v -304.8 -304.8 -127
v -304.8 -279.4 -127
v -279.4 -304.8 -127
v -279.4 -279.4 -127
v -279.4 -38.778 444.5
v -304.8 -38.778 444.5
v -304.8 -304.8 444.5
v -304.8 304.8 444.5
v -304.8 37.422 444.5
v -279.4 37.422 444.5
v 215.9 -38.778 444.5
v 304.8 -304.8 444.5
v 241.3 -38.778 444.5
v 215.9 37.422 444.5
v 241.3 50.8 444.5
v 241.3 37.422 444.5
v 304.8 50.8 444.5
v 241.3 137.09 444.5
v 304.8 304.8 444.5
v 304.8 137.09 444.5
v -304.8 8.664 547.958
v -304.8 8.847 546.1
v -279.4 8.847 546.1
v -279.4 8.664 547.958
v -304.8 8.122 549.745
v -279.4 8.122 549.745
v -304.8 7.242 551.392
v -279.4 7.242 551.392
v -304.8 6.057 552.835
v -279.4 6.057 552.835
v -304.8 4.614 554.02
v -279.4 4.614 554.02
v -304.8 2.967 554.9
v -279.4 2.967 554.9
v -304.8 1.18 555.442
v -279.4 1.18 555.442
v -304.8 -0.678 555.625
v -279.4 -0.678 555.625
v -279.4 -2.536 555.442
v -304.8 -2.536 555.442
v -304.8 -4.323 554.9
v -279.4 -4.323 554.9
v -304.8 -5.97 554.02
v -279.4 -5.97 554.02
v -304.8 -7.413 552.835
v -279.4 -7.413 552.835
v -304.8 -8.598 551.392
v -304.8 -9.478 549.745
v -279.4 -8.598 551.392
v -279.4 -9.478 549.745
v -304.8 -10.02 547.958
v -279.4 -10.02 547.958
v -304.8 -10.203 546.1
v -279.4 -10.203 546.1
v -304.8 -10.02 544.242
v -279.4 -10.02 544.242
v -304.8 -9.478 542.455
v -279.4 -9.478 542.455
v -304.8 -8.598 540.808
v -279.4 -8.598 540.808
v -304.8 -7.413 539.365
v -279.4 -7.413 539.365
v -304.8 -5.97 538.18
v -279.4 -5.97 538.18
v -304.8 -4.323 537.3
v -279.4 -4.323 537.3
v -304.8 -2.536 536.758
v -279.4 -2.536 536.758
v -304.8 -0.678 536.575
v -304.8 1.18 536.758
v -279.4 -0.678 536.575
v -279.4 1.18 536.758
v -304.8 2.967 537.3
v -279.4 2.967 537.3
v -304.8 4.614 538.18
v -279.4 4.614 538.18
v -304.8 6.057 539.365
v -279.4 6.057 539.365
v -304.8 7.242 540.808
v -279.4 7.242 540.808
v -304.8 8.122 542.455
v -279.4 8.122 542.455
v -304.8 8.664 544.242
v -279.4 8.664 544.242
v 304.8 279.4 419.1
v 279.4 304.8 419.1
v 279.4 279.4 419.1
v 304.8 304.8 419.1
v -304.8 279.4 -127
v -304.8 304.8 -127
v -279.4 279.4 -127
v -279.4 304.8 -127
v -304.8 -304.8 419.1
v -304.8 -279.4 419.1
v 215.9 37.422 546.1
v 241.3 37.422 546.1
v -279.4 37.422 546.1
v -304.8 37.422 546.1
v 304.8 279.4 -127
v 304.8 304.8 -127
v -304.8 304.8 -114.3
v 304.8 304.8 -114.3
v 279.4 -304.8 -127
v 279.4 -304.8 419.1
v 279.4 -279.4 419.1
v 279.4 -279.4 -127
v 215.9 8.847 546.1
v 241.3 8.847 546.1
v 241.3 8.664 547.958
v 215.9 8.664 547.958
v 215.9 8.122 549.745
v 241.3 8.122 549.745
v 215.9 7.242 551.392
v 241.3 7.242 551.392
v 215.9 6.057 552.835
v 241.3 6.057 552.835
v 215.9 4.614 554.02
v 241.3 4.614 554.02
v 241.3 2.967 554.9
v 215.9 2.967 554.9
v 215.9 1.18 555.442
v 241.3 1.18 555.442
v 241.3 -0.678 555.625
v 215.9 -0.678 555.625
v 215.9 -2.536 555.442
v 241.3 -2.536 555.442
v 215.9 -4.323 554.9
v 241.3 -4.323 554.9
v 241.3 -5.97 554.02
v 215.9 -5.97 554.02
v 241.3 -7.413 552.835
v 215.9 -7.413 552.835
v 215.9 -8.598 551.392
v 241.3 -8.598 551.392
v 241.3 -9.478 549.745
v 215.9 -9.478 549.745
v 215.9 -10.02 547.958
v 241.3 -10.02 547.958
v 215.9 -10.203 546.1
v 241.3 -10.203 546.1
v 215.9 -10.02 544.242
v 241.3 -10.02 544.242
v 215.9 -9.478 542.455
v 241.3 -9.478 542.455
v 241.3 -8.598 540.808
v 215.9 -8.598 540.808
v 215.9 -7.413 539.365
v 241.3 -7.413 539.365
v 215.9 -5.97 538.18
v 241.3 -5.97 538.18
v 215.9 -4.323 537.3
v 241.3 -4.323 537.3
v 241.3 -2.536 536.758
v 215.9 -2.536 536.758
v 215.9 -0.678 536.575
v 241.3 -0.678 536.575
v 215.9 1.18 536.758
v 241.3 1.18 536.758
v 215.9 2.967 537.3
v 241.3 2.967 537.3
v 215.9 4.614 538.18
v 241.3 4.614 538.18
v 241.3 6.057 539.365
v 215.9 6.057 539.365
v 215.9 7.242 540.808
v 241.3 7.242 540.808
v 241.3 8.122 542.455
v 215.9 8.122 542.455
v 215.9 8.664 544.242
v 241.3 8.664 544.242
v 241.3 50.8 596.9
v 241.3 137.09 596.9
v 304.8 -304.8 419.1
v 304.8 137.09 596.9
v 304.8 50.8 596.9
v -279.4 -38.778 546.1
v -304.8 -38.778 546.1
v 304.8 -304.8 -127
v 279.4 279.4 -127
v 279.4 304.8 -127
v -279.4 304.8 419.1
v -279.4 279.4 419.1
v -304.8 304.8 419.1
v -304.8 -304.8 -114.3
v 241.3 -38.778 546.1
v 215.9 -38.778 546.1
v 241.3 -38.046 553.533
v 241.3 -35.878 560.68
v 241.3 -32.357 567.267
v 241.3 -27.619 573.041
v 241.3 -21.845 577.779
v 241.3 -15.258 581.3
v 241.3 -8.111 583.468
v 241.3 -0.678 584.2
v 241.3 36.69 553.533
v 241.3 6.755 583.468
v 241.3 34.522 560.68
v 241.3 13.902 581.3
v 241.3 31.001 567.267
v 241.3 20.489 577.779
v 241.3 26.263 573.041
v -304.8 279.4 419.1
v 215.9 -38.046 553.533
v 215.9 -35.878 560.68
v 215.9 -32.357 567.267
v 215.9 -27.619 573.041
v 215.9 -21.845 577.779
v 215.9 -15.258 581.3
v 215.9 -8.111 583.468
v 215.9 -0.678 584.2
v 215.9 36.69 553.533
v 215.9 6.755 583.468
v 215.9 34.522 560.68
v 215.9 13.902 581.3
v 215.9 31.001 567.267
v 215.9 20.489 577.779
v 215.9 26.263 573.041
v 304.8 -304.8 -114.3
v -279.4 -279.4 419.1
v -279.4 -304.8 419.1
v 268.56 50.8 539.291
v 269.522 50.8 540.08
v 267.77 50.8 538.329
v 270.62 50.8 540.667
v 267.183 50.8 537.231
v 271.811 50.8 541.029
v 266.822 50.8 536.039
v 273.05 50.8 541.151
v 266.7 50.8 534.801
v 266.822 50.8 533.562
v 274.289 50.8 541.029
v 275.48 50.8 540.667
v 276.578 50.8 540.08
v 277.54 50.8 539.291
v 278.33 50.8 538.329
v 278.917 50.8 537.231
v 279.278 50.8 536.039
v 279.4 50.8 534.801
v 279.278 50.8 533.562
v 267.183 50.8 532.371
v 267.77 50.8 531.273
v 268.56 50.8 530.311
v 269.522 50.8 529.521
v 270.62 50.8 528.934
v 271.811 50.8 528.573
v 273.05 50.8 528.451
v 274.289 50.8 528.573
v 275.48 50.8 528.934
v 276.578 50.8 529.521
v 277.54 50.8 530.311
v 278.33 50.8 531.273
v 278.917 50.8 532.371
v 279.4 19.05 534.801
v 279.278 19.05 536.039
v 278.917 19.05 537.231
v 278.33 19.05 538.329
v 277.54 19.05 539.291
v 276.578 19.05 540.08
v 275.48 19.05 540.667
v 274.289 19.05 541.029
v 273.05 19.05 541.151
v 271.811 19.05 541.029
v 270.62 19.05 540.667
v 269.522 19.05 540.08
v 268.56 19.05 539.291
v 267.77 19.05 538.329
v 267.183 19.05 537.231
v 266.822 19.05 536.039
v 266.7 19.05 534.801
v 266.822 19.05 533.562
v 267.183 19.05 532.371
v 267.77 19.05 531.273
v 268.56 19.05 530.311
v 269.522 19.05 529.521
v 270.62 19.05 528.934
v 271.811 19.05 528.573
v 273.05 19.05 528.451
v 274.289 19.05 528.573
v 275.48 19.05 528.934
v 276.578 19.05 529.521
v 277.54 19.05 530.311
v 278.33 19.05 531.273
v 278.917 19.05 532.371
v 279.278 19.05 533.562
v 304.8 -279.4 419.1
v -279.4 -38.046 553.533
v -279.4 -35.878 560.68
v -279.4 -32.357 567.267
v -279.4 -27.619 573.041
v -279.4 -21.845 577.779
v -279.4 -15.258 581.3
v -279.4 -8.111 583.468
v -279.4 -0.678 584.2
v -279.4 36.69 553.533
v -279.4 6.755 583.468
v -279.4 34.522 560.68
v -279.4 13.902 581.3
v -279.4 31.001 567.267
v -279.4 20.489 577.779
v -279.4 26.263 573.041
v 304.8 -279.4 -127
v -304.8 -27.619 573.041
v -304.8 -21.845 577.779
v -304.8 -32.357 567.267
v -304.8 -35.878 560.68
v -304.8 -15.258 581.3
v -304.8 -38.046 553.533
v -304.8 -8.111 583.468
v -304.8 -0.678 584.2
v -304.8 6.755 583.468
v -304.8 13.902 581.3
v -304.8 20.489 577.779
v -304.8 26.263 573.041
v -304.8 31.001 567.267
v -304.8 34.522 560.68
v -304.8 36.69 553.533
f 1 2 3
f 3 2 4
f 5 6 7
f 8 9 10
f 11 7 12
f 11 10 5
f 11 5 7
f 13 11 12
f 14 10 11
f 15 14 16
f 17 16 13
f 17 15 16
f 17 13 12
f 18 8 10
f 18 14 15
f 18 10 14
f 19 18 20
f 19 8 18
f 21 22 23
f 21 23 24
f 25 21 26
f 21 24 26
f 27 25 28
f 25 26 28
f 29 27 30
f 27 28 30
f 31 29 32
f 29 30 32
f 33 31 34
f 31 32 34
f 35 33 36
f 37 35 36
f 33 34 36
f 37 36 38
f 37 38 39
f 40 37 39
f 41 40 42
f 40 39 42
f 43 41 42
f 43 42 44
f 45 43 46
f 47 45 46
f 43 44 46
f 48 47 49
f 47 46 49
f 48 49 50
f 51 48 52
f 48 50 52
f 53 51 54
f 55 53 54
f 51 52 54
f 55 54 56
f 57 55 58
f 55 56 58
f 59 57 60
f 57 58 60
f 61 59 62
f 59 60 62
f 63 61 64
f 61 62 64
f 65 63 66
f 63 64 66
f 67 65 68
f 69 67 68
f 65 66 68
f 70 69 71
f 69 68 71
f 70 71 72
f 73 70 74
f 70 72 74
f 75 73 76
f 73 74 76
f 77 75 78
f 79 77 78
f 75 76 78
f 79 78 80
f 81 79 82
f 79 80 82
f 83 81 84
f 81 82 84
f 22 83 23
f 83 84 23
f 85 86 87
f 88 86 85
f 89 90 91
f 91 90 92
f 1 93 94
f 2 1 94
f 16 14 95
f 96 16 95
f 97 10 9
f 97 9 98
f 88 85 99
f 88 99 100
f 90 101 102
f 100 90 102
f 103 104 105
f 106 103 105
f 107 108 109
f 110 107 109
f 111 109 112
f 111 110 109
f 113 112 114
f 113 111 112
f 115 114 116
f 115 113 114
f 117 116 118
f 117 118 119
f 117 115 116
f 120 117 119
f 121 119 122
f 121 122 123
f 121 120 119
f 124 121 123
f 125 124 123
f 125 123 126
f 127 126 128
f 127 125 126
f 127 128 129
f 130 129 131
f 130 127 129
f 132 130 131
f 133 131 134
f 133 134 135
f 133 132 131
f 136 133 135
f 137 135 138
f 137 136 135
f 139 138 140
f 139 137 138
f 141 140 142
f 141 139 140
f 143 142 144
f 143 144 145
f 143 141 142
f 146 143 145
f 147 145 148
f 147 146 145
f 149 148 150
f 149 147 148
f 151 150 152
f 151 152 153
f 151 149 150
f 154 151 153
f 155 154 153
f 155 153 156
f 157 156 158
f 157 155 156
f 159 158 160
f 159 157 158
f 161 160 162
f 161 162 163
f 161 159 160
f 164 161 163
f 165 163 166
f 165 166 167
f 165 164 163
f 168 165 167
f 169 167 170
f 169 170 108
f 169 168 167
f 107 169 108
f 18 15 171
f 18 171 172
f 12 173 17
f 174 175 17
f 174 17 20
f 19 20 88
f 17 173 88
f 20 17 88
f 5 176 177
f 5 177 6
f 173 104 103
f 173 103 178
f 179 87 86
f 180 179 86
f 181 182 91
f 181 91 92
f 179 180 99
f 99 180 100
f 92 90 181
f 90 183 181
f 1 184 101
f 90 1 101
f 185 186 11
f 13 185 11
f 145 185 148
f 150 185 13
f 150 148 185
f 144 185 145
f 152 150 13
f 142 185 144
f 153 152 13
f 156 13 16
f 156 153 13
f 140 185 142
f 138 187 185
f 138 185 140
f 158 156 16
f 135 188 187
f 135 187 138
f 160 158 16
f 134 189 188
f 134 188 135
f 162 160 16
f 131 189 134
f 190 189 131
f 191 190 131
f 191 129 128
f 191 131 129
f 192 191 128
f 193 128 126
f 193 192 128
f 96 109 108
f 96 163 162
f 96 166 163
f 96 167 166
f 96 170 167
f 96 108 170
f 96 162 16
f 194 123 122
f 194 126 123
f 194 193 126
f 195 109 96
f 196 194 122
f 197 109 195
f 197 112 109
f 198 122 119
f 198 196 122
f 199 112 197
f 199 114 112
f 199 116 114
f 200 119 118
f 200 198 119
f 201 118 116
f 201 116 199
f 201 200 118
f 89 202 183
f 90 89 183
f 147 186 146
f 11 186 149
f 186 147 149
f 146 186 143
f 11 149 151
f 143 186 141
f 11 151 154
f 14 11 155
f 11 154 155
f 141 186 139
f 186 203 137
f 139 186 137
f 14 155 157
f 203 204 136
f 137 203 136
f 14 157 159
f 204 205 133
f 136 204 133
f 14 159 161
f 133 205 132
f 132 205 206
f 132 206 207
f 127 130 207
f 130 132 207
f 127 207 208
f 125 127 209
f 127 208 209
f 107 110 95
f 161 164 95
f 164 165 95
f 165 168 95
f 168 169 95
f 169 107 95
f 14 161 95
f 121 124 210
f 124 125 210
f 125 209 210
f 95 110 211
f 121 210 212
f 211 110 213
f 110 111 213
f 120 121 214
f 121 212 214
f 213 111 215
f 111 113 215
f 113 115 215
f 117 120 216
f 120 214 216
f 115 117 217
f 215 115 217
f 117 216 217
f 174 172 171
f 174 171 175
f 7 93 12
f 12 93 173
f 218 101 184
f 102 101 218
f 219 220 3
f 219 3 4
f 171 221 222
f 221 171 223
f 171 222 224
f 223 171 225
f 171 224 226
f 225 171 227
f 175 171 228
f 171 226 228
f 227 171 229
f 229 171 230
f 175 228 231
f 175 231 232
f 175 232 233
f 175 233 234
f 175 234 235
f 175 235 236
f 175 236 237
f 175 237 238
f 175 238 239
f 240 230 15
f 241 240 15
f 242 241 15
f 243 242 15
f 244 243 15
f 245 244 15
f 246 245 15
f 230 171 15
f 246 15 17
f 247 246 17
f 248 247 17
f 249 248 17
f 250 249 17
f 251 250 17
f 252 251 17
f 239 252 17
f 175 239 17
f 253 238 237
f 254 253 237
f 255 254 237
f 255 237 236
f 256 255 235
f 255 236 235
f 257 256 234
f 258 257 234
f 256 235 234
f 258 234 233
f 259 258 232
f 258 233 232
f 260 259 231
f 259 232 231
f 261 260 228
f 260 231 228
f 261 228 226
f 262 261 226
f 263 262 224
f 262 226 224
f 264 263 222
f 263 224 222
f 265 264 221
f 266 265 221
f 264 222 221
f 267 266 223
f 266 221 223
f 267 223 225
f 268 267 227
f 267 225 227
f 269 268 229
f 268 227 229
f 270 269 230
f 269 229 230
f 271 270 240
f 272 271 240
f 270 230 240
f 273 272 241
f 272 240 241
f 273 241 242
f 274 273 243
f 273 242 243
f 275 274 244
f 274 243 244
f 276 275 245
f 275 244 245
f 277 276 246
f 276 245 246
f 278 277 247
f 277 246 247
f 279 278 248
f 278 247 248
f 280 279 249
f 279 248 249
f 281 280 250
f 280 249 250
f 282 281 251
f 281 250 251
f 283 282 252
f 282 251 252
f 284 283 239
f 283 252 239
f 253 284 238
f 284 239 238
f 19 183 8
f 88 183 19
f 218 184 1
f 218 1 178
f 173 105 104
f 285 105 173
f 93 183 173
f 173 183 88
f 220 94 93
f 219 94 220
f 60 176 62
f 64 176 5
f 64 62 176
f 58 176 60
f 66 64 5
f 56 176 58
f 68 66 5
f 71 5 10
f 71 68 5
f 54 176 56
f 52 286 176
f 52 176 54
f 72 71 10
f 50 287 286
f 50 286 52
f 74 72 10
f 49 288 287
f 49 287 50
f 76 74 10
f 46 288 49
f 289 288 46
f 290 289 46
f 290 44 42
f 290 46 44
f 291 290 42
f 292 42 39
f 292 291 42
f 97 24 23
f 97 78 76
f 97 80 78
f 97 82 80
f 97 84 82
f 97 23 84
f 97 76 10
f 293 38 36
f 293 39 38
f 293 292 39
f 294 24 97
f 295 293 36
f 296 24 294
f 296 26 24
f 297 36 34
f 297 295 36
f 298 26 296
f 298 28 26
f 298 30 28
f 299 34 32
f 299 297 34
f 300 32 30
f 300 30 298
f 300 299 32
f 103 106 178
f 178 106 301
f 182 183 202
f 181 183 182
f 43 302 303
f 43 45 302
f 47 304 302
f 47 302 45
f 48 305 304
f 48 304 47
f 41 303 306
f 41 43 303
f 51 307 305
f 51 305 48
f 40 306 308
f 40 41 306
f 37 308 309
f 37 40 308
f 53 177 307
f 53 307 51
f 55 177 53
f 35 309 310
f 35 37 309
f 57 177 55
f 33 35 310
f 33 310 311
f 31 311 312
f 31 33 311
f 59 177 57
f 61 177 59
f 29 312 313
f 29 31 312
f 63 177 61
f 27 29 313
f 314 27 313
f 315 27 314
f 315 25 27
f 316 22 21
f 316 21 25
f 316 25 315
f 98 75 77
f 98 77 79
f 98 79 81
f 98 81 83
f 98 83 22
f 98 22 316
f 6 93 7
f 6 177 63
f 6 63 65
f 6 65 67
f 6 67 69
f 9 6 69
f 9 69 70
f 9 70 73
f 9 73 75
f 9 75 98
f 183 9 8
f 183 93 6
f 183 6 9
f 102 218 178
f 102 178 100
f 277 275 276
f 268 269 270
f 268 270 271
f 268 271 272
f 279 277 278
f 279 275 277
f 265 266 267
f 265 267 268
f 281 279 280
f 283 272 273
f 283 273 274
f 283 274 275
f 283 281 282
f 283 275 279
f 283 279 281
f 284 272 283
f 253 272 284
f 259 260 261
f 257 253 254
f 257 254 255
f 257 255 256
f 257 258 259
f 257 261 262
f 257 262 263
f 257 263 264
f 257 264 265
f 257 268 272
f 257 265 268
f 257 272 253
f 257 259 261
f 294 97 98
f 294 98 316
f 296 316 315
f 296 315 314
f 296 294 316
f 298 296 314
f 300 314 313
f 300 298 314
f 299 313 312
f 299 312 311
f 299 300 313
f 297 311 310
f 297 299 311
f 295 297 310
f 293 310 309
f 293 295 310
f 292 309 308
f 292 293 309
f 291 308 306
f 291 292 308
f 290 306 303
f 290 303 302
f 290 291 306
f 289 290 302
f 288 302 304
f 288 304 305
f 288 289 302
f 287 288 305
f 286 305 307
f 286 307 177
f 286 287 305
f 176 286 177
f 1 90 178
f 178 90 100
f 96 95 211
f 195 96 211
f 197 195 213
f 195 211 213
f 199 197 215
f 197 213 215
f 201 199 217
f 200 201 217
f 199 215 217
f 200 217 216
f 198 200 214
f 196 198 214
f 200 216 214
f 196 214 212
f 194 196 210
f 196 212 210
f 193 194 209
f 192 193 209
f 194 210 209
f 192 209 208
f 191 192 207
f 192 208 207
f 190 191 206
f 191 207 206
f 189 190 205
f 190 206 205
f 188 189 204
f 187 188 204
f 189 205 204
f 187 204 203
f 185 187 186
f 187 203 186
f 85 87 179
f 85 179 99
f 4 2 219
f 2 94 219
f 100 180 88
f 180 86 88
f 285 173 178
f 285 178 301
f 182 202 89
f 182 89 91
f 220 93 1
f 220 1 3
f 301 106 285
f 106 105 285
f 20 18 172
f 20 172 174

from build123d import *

# Parameters (mm, degrees)
F0_W          = 25.4
F0_H          = 25.4
F1_DEPTH      = 419.1
F1_DEPTH_BACK = 127
F3_START      = 419.1
F2_W          = 609.6
F2_H          = 609.6
F3_DEPTH      = 25.4
F5_START      = -279.4
F4_R          = 9.525
F5_DEPTH      = 25.4
F6_START      = 215.9
F6_DEPTH      = 25.4
F7_W          = 63.5
F7_H          = 86.2903104544
F8_DEPTH      = 152.4
F9_R          = 6.35
F10_DEPTH     = 31.75
F12_START     = -114.300254
F11_W         = 609.6
F11_H         = 609.6
F12_DEPTH     = 12.7


with BuildPart() as f1:
    # F0 (on Top) → F1 (new body, two sides)
    with BuildSketch(Plane.XY) as f1_sk:
        with Locations((-292.1, 292.1)):
            Rectangle(F0_W, F0_H)
    extrude(amount=F1_DEPTH)
    extrude(f1_sk.sketch, amount=-F1_DEPTH_BACK)


with BuildPart() as f1b:
    # F0 (on Top) → F1, piece 2 (new body, two sides)
    with BuildSketch(Plane.XY) as f1_2_sk:
        with Locations((292.1, 292.1)):
            Rectangle(F0_W, F0_H)
    extrude(amount=F1_DEPTH)
    extrude(f1_2_sk.sketch, amount=-F1_DEPTH_BACK)


with BuildPart() as f1c:
    # F0 (on Top) → F1, piece 3 (new body, two sides)
    with BuildSketch(Plane.XY) as f1_3_sk:
        with Locations((292.1, -292.1)):
            Rectangle(F0_W, F0_H)
    extrude(amount=F1_DEPTH)
    extrude(f1_3_sk.sketch, amount=-F1_DEPTH_BACK)


with BuildPart() as f1d:
    # F0 (on Top) → F1, piece 4 (new body, two sides)
    with BuildSketch(Plane.XY) as f1_4_sk:
        with Locations((-292.1, -292.1)):
            Rectangle(F0_W, F0_H)
    extrude(amount=F1_DEPTH)
    extrude(f1_4_sk.sketch, amount=-F1_DEPTH_BACK)


with BuildPart() as f3:
    # F2 (on Top) → F3 (new body)
    with BuildSketch(Plane.XY.offset(F3_START)):
        Rectangle(F2_W, F2_H)
    extrude(amount=F3_DEPTH)

    # F4 (on Right) → F5 (join)
    with BuildSketch(Plane.YZ.offset(F5_START)):
        with BuildLine():
            Line((-38.7780400669, 546.1), (-38.7780400669, 444.5))
            Line((-38.7780400669, 444.5), (37.4219599331, 444.5))
            Line((37.4219599331, 444.5), (37.4219599331, 546.1))
            ThreePointArc((37.4219599331, 546.1), (-0.6780400669, 584.2), (-38.7780400669, 546.1))
        make_face()
        with Locations((-0.6780400669, 546.1)):
            Circle(F4_R, mode=Mode.SUBTRACT)
    extrude(amount=-F5_DEPTH)

    # F4 (on Right) → F6 (join)
    with BuildSketch(Plane.YZ.offset(F6_START)):
        with BuildLine():
            Line((-38.7780400669, 546.1), (-38.7780400669, 444.5))
            Line((-38.7780400669, 444.5), (37.4219599331, 444.5))
            Line((37.4219599331, 444.5), (37.4219599331, 546.1))
            ThreePointArc((37.4219599331, 546.1), (-0.6780400669, 584.2), (-38.7780400669, 546.1))
        make_face()
        with Locations((-0.6780400669, 546.1)):
            Circle(F4_R, mode=Mode.SUBTRACT)
    extrude(amount=F6_DEPTH)

    # F7 (on face) → F8 (join)
    with BuildSketch(Plane.XY.offset(444.5)):
        with Locations((273.05, 93.9451552272)):
            Rectangle(F7_W, F7_H)
    extrude(amount=F8_DEPTH)

    # F9 (on face) → F10 (join)
    with BuildSketch(Plane.XZ.offset(-50.8)):
        with Locations((273.05, 534.8006486893)):
            Circle(F9_R)
    extrude(amount=F10_DEPTH)


with BuildPart() as f12:
    # F11 (on Top) → F12 (new body)
    with BuildSketch(Plane.XY.offset(F12_START)):
        Rectangle(F11_W, F11_H)
    extrude(amount=-F12_DEPTH)


solid = Compound([f1.part, f1b.part, f1c.part, f1d.part, f3.part, f12.part])
